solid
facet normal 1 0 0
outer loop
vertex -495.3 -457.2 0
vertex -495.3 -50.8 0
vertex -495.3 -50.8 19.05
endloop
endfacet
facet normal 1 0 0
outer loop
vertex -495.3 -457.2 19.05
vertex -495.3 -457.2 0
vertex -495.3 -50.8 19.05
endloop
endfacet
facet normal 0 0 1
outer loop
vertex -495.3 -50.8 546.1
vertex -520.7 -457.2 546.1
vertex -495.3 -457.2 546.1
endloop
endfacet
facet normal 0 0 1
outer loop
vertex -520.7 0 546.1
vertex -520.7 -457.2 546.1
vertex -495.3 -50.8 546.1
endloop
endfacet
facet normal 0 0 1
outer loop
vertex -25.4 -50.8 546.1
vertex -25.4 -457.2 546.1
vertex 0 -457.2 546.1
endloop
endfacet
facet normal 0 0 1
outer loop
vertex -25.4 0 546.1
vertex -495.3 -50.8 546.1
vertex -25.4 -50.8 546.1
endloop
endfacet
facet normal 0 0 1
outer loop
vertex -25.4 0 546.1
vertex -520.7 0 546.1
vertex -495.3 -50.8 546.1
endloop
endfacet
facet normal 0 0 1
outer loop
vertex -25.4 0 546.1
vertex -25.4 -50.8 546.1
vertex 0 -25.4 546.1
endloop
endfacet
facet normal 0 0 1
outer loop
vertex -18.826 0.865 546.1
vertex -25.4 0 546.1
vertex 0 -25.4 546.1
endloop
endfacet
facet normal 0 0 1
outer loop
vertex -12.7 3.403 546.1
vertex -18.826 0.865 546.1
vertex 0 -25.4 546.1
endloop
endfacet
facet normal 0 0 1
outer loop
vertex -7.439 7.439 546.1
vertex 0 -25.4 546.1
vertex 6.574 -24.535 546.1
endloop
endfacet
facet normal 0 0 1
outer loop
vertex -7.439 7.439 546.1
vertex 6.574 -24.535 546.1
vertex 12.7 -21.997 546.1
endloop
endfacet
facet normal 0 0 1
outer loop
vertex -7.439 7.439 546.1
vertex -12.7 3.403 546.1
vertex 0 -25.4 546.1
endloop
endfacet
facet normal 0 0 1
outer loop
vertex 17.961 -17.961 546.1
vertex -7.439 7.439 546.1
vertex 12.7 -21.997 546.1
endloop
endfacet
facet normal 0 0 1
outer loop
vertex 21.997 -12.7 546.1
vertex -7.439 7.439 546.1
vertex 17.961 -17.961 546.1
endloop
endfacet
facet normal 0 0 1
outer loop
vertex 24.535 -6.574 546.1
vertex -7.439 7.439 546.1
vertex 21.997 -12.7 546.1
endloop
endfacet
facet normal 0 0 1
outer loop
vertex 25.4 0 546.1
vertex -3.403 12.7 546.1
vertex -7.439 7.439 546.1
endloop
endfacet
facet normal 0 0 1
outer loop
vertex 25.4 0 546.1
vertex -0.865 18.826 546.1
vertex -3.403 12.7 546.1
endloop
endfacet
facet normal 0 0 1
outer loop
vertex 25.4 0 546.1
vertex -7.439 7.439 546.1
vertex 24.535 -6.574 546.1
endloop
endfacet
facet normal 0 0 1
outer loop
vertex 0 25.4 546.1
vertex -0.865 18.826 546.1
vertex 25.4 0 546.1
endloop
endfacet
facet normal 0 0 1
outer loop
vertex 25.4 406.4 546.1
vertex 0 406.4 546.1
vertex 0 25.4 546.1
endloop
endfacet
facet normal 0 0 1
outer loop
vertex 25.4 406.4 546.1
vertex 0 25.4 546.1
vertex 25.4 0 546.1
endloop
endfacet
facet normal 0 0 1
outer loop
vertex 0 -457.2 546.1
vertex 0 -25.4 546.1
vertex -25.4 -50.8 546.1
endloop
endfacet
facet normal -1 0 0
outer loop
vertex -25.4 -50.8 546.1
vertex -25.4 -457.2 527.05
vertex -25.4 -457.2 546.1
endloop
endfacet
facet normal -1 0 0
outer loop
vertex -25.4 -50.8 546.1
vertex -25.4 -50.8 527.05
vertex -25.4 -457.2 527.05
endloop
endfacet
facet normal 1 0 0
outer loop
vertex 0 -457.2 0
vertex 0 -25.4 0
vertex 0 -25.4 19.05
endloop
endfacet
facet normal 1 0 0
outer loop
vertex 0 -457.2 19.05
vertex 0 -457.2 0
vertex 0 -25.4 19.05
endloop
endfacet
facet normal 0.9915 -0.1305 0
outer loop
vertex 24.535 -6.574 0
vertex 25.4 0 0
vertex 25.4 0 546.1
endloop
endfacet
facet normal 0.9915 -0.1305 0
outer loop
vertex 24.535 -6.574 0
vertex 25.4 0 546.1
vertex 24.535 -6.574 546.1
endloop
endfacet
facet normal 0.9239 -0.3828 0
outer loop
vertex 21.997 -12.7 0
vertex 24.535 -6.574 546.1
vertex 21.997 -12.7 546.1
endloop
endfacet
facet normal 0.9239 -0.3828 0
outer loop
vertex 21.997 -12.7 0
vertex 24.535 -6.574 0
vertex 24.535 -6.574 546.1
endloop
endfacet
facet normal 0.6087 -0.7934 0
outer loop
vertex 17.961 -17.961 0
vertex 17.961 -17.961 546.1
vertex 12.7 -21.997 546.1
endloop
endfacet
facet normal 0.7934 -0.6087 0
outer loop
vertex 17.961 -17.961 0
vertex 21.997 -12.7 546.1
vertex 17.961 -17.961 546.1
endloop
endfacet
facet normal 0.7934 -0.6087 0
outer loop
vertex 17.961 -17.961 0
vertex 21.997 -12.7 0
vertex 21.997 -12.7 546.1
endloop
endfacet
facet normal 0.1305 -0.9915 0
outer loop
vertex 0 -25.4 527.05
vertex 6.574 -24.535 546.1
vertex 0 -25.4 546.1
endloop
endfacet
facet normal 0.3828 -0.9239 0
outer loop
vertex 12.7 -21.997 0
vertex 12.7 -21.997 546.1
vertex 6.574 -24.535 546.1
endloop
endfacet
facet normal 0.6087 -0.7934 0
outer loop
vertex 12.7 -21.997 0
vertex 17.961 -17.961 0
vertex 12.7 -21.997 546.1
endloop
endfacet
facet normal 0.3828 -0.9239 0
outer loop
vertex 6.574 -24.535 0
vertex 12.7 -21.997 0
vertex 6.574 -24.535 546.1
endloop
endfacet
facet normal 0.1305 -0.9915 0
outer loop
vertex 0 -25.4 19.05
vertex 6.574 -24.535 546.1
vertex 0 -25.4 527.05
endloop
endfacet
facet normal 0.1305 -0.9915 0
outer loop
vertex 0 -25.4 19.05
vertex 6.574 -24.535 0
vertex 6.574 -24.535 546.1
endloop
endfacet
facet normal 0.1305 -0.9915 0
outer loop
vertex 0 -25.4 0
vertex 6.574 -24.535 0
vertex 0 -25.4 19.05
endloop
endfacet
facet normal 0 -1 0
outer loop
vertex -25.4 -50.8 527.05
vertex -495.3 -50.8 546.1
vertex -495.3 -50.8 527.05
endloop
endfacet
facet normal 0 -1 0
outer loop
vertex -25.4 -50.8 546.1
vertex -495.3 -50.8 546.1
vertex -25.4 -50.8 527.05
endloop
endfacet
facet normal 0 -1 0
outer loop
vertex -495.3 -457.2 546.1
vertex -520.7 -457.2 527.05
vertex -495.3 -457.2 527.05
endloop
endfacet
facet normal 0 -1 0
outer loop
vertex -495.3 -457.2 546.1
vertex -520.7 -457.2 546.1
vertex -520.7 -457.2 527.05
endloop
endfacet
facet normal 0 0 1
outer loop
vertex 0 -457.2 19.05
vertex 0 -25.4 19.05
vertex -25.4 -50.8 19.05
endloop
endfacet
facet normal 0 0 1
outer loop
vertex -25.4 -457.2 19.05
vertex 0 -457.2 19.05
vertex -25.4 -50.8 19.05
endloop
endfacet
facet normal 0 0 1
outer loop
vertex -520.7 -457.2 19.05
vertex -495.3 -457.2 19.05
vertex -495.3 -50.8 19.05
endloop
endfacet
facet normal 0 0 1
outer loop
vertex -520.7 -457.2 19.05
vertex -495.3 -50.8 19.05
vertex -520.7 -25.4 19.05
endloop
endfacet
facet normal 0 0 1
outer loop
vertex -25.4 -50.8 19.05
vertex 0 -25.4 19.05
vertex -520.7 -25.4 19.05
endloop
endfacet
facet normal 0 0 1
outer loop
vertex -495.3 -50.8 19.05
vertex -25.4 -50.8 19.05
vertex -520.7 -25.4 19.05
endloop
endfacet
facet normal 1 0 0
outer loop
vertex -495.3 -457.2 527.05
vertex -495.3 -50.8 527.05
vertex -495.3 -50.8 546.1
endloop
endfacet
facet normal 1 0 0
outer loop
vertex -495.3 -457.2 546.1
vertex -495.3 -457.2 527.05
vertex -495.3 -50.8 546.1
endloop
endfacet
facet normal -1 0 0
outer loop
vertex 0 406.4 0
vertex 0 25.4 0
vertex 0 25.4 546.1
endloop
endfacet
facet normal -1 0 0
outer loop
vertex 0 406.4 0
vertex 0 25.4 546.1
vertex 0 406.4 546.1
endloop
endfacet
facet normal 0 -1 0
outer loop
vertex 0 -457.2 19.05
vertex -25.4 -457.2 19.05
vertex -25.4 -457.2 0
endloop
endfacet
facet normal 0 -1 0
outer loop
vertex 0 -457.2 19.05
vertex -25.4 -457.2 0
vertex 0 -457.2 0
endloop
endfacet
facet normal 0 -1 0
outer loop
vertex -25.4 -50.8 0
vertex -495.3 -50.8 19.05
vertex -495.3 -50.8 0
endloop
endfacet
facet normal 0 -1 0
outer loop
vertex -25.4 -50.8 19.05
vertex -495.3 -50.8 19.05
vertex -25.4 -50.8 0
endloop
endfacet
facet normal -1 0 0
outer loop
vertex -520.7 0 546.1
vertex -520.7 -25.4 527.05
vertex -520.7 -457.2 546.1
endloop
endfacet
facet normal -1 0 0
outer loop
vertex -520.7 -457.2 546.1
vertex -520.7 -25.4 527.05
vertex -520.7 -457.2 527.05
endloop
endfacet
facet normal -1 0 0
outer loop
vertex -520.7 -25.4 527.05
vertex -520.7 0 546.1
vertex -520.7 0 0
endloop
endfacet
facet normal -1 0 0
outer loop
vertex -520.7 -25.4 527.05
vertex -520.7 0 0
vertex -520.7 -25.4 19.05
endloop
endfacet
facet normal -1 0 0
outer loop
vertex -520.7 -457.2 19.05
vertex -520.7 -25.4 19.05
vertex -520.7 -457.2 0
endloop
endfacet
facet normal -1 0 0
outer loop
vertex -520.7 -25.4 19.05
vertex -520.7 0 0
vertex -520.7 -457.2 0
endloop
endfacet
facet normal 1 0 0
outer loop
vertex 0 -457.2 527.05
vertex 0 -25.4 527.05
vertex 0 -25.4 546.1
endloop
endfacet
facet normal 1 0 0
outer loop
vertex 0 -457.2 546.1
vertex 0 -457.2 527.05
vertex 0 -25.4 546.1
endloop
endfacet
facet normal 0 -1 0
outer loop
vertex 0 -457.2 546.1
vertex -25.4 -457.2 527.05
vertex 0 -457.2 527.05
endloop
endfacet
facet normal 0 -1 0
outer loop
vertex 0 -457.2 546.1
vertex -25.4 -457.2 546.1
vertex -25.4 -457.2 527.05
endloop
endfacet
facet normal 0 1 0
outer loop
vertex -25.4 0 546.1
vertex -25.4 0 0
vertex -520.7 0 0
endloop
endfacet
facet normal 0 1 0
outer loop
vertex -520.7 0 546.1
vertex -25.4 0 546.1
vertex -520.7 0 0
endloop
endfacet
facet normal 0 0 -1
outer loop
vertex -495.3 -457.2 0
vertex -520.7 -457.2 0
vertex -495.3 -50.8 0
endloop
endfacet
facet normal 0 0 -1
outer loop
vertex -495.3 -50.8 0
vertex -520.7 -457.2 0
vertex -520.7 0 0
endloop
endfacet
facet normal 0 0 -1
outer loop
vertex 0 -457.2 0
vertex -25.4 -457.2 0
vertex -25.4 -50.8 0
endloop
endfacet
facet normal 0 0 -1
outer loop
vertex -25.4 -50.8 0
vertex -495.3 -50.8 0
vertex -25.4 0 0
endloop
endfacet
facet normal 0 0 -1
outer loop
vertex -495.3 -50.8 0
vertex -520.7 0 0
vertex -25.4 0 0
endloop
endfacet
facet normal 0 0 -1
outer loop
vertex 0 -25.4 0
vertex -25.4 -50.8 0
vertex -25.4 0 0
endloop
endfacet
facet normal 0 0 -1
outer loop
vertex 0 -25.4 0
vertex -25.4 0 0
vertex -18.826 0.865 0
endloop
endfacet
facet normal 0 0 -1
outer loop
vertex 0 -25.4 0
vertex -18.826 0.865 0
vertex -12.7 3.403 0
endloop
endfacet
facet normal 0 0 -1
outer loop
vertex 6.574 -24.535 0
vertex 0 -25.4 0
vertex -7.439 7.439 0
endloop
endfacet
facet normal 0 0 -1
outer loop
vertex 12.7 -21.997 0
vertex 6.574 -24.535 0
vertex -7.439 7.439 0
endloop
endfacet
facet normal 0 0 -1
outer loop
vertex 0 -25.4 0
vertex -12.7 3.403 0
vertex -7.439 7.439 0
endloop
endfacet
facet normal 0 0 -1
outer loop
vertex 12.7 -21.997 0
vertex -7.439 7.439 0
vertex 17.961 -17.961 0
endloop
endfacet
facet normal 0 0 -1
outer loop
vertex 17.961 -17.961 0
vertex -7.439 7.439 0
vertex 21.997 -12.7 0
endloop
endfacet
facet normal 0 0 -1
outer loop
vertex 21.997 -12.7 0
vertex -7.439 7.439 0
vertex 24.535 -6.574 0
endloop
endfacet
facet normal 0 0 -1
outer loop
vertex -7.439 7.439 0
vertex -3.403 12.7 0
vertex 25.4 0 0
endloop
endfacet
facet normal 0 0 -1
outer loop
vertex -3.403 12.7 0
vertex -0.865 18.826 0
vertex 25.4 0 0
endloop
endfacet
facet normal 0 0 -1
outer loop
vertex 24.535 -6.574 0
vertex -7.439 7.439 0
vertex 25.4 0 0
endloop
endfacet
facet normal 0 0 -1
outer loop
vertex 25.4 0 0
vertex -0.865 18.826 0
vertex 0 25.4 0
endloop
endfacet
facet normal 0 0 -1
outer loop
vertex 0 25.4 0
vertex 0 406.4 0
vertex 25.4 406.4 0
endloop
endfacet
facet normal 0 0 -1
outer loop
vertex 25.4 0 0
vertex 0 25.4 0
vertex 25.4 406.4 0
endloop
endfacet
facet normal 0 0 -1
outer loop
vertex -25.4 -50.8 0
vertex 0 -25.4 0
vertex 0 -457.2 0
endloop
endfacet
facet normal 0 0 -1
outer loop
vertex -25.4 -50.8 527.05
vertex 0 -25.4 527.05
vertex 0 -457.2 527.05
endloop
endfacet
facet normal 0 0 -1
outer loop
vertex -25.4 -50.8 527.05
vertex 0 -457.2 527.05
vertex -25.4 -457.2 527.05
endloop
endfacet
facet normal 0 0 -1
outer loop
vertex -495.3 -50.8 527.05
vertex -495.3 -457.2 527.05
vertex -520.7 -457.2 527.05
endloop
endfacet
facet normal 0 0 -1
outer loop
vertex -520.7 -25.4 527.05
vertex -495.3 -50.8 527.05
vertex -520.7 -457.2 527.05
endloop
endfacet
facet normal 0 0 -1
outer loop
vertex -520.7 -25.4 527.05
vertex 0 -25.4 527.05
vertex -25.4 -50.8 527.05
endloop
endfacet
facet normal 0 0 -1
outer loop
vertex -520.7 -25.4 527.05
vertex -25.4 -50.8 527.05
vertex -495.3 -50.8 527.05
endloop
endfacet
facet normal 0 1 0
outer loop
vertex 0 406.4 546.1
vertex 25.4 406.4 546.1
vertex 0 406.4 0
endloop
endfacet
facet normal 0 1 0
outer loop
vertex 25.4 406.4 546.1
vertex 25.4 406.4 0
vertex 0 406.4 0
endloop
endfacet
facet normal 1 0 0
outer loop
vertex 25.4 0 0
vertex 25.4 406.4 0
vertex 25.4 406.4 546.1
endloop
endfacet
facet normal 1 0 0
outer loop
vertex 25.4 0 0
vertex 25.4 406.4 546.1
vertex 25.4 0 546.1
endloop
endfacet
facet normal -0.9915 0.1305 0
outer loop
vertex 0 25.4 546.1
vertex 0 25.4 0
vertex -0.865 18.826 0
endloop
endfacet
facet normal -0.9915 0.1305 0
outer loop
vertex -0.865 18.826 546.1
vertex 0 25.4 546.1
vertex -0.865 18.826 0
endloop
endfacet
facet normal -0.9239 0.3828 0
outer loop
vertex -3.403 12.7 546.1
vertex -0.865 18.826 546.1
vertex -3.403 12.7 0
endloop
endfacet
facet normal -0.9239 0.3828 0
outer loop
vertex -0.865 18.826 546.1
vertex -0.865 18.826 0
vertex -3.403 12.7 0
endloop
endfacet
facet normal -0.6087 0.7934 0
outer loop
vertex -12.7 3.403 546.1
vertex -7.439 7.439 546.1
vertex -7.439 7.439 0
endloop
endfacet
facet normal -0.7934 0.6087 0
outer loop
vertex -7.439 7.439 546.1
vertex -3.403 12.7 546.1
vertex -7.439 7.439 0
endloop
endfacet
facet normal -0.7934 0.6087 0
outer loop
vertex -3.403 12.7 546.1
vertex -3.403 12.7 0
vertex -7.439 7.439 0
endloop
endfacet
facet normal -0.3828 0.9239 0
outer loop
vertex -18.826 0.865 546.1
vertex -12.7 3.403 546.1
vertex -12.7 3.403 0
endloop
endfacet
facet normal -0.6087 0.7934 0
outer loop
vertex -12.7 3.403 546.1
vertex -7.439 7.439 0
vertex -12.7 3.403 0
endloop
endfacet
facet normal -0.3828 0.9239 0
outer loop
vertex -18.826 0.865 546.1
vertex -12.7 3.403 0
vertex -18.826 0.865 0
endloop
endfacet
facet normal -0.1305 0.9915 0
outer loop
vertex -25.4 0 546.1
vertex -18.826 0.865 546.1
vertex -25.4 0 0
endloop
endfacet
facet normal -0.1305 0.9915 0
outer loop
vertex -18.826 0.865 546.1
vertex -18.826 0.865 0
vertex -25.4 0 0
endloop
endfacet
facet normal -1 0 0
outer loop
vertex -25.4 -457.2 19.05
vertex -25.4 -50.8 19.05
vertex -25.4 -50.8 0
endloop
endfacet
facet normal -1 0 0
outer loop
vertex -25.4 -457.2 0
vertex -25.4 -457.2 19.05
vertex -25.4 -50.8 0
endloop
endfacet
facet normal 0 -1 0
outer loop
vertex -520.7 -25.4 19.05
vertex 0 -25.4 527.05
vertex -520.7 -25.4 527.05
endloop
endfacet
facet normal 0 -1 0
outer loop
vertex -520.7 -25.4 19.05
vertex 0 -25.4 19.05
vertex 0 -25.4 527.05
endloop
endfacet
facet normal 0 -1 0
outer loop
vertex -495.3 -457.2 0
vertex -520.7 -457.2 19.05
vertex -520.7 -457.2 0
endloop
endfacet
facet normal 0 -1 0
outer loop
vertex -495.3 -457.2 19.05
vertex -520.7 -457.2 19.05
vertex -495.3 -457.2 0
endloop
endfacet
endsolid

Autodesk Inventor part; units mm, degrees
ref_plane "YZ Plane" through (0, 0, 0) normal (1, 0, 0) x (0, 1, 0)
ref_plane "XZ Plane" through (0, 0, 0) normal (0, 1, 0) x (-1, 0, 0)
ref_plane "XY Plane" through (0, 0, 0) normal (0, 0, 1) x (1, 0, 0)
sketch "Sketch1" plane through (0, 0, 0) normal (0, 0, 1) x (1, 0, 0)
  line L0 (-25.4, 0) -> (-520.7, 0)
  line L1 (0, 25.4) -> (0, 406.4)
  line L2 (25.4, 406.4) -> (25.4, 0)
  line L3 (0, -25.4) -> (-520.7, -25.4)
  line L4 (-520.7, 0) -> (-520.7, -25.4)
  line L5 (25.4, 406.4) -> (0, 406.4)
  arc A0 (22.225, -25.4) -> (25.4, -22.225) centre (22.225, -22.225) ccw
  arc A1 (-25.4, 0) -> (0, 25.4) centre (-25.4, 25.4) ccw
  arc A2 (0, -25.4) -> (25.4, 0) centre (0, 0) ccw
  point P0 (0, 0)
  dimension "d0" = 520.7
  dimension "d1" = 406.4
  dimension "d2" = 25.4
  dimension "d3" = 3.175
  dimension "d6" = 25.4
extrude "Extrusion1" add sketch "Sketch1" along normal blind 546.1
sketch "Sketch2" plane through (-520.7, -25.4, 0) normal (0, -1, 0) x (1, 0, 0)
  line L0 (520.7, 0) -> (520.7, 546.1) construction
  line L1 (520.7, 273.05) -> (0, 273.05) construction
  line L2 (0, 0) -> (0, 546.1) construction
  line L3 (495.3, 546.1) -> (0, 546.1) construction
  line L4 (260.35, 546.1) -> (260.35, 0) construction
  line L5 (0, 0) -> (520.7, 0) construction
  line L6 (495.3, 546.1) -> (495.3, 527.05)
  line L7 (495.3, 0) -> (495.3, 546.1) projected
  line L8 (495.3, 527.05) -> (25.4, 527.05)
  line L9 (25.4, 527.05) -> (25.4, 546.1)
  line L10 (495.3, 546.1) -> (25.4, 546.1)
  line L11 (495.3, 0) -> (0, 0) construction
  line L12 (495.3, 0) -> (495.3, 19.05)
  line L13 (495.3, 19.05) -> (25.4, 19.05)
  line L14 (25.4, 19.05) -> (25.4, 0)
  line L15 (495.3, 0) -> (25.4, 0)
  point P0 (25.4, 536.575)
  point P1 (25.4, 9.525)
  dimension "d7" = 19.05
  dimension "d8" = 25.4
extrude "Extrusion2" add sketch "Sketch2" along normal blind 25.4
sketch "Sketch4" plane through (0, -25.4, 0) normal (0, -1, 0) x (1, 0, 0)
  line L0 (-25.4, 527.05) -> (-25.4, 546.1) projected
  line L1 (-25.4, 527.05) -> (0, 527.05)
  line L2 (0, 0) -> (0, 546.1) projected
  line L3 (-25.4, 546.1) -> (-495.3, 546.1) projected
  line L4 (0, 546.1) -> (-25.4, 546.1)
  line L5 (-25.4, 546.1) -> (-25.4, 527.05)
  line L6 (25.4, 0) -> (25.4, 546.1) construction
  line L7 (25.4, 273.05) -> (-520.7, 273.05) construction
  line L8 (-520.7, 0) -> (-520.7, 546.1) construction
  line L9 (-495.3, 0) -> (-25.4, 0) construction
  line L10 (-247.65, 0) -> (-247.65, 546.1) construction
  line L11 (-25.4, 19.05) -> (-25.4, 0)
  line L12 (-25.4, 19.05) -> (0, 19.05)
  line L13 (0, 0) -> (-25.4, 0)
  line L14 (-25.4, 0) -> (-25.4, 19.05)
  line L15 (-495.3, 546.1) -> (-520.7, 546.1)
  line L16 (-520.7, 527.05) -> (-495.3, 527.05)
  line L17 (-495.3, 527.05) -> (-495.3, 546.1)
  line L18 (-495.3, 0) -> (-495.3, 19.05) projected
  line L19 (-495.3, 19.05) -> (-520.7, 19.05)
  line L20 (-520.7, 0) -> (-495.3, 0) projected
  line L21 (-520.7, 0) -> (-495.3, 0)
  line L22 (-495.3, 0) -> (-495.3, 19.05)
  line L23 (-25.4, 546.1) -> (-25.4, 527.05)
  line L24 (0, 546.1) -> (0, 527.05)
  line L25 (-495.3, 546.1) -> (-495.3, 527.05)
  line L26 (-520.7, 527.05) -> (-520.7, 546.1)
  line L27 (-495.3, 19.05) -> (-495.3, 0)
  line L28 (-520.7, 0) -> (-520.7, 19.05)
extrude "Extrusion3" add sketch "Sketch4" along normal blind 431.8
properties part number "chair"
